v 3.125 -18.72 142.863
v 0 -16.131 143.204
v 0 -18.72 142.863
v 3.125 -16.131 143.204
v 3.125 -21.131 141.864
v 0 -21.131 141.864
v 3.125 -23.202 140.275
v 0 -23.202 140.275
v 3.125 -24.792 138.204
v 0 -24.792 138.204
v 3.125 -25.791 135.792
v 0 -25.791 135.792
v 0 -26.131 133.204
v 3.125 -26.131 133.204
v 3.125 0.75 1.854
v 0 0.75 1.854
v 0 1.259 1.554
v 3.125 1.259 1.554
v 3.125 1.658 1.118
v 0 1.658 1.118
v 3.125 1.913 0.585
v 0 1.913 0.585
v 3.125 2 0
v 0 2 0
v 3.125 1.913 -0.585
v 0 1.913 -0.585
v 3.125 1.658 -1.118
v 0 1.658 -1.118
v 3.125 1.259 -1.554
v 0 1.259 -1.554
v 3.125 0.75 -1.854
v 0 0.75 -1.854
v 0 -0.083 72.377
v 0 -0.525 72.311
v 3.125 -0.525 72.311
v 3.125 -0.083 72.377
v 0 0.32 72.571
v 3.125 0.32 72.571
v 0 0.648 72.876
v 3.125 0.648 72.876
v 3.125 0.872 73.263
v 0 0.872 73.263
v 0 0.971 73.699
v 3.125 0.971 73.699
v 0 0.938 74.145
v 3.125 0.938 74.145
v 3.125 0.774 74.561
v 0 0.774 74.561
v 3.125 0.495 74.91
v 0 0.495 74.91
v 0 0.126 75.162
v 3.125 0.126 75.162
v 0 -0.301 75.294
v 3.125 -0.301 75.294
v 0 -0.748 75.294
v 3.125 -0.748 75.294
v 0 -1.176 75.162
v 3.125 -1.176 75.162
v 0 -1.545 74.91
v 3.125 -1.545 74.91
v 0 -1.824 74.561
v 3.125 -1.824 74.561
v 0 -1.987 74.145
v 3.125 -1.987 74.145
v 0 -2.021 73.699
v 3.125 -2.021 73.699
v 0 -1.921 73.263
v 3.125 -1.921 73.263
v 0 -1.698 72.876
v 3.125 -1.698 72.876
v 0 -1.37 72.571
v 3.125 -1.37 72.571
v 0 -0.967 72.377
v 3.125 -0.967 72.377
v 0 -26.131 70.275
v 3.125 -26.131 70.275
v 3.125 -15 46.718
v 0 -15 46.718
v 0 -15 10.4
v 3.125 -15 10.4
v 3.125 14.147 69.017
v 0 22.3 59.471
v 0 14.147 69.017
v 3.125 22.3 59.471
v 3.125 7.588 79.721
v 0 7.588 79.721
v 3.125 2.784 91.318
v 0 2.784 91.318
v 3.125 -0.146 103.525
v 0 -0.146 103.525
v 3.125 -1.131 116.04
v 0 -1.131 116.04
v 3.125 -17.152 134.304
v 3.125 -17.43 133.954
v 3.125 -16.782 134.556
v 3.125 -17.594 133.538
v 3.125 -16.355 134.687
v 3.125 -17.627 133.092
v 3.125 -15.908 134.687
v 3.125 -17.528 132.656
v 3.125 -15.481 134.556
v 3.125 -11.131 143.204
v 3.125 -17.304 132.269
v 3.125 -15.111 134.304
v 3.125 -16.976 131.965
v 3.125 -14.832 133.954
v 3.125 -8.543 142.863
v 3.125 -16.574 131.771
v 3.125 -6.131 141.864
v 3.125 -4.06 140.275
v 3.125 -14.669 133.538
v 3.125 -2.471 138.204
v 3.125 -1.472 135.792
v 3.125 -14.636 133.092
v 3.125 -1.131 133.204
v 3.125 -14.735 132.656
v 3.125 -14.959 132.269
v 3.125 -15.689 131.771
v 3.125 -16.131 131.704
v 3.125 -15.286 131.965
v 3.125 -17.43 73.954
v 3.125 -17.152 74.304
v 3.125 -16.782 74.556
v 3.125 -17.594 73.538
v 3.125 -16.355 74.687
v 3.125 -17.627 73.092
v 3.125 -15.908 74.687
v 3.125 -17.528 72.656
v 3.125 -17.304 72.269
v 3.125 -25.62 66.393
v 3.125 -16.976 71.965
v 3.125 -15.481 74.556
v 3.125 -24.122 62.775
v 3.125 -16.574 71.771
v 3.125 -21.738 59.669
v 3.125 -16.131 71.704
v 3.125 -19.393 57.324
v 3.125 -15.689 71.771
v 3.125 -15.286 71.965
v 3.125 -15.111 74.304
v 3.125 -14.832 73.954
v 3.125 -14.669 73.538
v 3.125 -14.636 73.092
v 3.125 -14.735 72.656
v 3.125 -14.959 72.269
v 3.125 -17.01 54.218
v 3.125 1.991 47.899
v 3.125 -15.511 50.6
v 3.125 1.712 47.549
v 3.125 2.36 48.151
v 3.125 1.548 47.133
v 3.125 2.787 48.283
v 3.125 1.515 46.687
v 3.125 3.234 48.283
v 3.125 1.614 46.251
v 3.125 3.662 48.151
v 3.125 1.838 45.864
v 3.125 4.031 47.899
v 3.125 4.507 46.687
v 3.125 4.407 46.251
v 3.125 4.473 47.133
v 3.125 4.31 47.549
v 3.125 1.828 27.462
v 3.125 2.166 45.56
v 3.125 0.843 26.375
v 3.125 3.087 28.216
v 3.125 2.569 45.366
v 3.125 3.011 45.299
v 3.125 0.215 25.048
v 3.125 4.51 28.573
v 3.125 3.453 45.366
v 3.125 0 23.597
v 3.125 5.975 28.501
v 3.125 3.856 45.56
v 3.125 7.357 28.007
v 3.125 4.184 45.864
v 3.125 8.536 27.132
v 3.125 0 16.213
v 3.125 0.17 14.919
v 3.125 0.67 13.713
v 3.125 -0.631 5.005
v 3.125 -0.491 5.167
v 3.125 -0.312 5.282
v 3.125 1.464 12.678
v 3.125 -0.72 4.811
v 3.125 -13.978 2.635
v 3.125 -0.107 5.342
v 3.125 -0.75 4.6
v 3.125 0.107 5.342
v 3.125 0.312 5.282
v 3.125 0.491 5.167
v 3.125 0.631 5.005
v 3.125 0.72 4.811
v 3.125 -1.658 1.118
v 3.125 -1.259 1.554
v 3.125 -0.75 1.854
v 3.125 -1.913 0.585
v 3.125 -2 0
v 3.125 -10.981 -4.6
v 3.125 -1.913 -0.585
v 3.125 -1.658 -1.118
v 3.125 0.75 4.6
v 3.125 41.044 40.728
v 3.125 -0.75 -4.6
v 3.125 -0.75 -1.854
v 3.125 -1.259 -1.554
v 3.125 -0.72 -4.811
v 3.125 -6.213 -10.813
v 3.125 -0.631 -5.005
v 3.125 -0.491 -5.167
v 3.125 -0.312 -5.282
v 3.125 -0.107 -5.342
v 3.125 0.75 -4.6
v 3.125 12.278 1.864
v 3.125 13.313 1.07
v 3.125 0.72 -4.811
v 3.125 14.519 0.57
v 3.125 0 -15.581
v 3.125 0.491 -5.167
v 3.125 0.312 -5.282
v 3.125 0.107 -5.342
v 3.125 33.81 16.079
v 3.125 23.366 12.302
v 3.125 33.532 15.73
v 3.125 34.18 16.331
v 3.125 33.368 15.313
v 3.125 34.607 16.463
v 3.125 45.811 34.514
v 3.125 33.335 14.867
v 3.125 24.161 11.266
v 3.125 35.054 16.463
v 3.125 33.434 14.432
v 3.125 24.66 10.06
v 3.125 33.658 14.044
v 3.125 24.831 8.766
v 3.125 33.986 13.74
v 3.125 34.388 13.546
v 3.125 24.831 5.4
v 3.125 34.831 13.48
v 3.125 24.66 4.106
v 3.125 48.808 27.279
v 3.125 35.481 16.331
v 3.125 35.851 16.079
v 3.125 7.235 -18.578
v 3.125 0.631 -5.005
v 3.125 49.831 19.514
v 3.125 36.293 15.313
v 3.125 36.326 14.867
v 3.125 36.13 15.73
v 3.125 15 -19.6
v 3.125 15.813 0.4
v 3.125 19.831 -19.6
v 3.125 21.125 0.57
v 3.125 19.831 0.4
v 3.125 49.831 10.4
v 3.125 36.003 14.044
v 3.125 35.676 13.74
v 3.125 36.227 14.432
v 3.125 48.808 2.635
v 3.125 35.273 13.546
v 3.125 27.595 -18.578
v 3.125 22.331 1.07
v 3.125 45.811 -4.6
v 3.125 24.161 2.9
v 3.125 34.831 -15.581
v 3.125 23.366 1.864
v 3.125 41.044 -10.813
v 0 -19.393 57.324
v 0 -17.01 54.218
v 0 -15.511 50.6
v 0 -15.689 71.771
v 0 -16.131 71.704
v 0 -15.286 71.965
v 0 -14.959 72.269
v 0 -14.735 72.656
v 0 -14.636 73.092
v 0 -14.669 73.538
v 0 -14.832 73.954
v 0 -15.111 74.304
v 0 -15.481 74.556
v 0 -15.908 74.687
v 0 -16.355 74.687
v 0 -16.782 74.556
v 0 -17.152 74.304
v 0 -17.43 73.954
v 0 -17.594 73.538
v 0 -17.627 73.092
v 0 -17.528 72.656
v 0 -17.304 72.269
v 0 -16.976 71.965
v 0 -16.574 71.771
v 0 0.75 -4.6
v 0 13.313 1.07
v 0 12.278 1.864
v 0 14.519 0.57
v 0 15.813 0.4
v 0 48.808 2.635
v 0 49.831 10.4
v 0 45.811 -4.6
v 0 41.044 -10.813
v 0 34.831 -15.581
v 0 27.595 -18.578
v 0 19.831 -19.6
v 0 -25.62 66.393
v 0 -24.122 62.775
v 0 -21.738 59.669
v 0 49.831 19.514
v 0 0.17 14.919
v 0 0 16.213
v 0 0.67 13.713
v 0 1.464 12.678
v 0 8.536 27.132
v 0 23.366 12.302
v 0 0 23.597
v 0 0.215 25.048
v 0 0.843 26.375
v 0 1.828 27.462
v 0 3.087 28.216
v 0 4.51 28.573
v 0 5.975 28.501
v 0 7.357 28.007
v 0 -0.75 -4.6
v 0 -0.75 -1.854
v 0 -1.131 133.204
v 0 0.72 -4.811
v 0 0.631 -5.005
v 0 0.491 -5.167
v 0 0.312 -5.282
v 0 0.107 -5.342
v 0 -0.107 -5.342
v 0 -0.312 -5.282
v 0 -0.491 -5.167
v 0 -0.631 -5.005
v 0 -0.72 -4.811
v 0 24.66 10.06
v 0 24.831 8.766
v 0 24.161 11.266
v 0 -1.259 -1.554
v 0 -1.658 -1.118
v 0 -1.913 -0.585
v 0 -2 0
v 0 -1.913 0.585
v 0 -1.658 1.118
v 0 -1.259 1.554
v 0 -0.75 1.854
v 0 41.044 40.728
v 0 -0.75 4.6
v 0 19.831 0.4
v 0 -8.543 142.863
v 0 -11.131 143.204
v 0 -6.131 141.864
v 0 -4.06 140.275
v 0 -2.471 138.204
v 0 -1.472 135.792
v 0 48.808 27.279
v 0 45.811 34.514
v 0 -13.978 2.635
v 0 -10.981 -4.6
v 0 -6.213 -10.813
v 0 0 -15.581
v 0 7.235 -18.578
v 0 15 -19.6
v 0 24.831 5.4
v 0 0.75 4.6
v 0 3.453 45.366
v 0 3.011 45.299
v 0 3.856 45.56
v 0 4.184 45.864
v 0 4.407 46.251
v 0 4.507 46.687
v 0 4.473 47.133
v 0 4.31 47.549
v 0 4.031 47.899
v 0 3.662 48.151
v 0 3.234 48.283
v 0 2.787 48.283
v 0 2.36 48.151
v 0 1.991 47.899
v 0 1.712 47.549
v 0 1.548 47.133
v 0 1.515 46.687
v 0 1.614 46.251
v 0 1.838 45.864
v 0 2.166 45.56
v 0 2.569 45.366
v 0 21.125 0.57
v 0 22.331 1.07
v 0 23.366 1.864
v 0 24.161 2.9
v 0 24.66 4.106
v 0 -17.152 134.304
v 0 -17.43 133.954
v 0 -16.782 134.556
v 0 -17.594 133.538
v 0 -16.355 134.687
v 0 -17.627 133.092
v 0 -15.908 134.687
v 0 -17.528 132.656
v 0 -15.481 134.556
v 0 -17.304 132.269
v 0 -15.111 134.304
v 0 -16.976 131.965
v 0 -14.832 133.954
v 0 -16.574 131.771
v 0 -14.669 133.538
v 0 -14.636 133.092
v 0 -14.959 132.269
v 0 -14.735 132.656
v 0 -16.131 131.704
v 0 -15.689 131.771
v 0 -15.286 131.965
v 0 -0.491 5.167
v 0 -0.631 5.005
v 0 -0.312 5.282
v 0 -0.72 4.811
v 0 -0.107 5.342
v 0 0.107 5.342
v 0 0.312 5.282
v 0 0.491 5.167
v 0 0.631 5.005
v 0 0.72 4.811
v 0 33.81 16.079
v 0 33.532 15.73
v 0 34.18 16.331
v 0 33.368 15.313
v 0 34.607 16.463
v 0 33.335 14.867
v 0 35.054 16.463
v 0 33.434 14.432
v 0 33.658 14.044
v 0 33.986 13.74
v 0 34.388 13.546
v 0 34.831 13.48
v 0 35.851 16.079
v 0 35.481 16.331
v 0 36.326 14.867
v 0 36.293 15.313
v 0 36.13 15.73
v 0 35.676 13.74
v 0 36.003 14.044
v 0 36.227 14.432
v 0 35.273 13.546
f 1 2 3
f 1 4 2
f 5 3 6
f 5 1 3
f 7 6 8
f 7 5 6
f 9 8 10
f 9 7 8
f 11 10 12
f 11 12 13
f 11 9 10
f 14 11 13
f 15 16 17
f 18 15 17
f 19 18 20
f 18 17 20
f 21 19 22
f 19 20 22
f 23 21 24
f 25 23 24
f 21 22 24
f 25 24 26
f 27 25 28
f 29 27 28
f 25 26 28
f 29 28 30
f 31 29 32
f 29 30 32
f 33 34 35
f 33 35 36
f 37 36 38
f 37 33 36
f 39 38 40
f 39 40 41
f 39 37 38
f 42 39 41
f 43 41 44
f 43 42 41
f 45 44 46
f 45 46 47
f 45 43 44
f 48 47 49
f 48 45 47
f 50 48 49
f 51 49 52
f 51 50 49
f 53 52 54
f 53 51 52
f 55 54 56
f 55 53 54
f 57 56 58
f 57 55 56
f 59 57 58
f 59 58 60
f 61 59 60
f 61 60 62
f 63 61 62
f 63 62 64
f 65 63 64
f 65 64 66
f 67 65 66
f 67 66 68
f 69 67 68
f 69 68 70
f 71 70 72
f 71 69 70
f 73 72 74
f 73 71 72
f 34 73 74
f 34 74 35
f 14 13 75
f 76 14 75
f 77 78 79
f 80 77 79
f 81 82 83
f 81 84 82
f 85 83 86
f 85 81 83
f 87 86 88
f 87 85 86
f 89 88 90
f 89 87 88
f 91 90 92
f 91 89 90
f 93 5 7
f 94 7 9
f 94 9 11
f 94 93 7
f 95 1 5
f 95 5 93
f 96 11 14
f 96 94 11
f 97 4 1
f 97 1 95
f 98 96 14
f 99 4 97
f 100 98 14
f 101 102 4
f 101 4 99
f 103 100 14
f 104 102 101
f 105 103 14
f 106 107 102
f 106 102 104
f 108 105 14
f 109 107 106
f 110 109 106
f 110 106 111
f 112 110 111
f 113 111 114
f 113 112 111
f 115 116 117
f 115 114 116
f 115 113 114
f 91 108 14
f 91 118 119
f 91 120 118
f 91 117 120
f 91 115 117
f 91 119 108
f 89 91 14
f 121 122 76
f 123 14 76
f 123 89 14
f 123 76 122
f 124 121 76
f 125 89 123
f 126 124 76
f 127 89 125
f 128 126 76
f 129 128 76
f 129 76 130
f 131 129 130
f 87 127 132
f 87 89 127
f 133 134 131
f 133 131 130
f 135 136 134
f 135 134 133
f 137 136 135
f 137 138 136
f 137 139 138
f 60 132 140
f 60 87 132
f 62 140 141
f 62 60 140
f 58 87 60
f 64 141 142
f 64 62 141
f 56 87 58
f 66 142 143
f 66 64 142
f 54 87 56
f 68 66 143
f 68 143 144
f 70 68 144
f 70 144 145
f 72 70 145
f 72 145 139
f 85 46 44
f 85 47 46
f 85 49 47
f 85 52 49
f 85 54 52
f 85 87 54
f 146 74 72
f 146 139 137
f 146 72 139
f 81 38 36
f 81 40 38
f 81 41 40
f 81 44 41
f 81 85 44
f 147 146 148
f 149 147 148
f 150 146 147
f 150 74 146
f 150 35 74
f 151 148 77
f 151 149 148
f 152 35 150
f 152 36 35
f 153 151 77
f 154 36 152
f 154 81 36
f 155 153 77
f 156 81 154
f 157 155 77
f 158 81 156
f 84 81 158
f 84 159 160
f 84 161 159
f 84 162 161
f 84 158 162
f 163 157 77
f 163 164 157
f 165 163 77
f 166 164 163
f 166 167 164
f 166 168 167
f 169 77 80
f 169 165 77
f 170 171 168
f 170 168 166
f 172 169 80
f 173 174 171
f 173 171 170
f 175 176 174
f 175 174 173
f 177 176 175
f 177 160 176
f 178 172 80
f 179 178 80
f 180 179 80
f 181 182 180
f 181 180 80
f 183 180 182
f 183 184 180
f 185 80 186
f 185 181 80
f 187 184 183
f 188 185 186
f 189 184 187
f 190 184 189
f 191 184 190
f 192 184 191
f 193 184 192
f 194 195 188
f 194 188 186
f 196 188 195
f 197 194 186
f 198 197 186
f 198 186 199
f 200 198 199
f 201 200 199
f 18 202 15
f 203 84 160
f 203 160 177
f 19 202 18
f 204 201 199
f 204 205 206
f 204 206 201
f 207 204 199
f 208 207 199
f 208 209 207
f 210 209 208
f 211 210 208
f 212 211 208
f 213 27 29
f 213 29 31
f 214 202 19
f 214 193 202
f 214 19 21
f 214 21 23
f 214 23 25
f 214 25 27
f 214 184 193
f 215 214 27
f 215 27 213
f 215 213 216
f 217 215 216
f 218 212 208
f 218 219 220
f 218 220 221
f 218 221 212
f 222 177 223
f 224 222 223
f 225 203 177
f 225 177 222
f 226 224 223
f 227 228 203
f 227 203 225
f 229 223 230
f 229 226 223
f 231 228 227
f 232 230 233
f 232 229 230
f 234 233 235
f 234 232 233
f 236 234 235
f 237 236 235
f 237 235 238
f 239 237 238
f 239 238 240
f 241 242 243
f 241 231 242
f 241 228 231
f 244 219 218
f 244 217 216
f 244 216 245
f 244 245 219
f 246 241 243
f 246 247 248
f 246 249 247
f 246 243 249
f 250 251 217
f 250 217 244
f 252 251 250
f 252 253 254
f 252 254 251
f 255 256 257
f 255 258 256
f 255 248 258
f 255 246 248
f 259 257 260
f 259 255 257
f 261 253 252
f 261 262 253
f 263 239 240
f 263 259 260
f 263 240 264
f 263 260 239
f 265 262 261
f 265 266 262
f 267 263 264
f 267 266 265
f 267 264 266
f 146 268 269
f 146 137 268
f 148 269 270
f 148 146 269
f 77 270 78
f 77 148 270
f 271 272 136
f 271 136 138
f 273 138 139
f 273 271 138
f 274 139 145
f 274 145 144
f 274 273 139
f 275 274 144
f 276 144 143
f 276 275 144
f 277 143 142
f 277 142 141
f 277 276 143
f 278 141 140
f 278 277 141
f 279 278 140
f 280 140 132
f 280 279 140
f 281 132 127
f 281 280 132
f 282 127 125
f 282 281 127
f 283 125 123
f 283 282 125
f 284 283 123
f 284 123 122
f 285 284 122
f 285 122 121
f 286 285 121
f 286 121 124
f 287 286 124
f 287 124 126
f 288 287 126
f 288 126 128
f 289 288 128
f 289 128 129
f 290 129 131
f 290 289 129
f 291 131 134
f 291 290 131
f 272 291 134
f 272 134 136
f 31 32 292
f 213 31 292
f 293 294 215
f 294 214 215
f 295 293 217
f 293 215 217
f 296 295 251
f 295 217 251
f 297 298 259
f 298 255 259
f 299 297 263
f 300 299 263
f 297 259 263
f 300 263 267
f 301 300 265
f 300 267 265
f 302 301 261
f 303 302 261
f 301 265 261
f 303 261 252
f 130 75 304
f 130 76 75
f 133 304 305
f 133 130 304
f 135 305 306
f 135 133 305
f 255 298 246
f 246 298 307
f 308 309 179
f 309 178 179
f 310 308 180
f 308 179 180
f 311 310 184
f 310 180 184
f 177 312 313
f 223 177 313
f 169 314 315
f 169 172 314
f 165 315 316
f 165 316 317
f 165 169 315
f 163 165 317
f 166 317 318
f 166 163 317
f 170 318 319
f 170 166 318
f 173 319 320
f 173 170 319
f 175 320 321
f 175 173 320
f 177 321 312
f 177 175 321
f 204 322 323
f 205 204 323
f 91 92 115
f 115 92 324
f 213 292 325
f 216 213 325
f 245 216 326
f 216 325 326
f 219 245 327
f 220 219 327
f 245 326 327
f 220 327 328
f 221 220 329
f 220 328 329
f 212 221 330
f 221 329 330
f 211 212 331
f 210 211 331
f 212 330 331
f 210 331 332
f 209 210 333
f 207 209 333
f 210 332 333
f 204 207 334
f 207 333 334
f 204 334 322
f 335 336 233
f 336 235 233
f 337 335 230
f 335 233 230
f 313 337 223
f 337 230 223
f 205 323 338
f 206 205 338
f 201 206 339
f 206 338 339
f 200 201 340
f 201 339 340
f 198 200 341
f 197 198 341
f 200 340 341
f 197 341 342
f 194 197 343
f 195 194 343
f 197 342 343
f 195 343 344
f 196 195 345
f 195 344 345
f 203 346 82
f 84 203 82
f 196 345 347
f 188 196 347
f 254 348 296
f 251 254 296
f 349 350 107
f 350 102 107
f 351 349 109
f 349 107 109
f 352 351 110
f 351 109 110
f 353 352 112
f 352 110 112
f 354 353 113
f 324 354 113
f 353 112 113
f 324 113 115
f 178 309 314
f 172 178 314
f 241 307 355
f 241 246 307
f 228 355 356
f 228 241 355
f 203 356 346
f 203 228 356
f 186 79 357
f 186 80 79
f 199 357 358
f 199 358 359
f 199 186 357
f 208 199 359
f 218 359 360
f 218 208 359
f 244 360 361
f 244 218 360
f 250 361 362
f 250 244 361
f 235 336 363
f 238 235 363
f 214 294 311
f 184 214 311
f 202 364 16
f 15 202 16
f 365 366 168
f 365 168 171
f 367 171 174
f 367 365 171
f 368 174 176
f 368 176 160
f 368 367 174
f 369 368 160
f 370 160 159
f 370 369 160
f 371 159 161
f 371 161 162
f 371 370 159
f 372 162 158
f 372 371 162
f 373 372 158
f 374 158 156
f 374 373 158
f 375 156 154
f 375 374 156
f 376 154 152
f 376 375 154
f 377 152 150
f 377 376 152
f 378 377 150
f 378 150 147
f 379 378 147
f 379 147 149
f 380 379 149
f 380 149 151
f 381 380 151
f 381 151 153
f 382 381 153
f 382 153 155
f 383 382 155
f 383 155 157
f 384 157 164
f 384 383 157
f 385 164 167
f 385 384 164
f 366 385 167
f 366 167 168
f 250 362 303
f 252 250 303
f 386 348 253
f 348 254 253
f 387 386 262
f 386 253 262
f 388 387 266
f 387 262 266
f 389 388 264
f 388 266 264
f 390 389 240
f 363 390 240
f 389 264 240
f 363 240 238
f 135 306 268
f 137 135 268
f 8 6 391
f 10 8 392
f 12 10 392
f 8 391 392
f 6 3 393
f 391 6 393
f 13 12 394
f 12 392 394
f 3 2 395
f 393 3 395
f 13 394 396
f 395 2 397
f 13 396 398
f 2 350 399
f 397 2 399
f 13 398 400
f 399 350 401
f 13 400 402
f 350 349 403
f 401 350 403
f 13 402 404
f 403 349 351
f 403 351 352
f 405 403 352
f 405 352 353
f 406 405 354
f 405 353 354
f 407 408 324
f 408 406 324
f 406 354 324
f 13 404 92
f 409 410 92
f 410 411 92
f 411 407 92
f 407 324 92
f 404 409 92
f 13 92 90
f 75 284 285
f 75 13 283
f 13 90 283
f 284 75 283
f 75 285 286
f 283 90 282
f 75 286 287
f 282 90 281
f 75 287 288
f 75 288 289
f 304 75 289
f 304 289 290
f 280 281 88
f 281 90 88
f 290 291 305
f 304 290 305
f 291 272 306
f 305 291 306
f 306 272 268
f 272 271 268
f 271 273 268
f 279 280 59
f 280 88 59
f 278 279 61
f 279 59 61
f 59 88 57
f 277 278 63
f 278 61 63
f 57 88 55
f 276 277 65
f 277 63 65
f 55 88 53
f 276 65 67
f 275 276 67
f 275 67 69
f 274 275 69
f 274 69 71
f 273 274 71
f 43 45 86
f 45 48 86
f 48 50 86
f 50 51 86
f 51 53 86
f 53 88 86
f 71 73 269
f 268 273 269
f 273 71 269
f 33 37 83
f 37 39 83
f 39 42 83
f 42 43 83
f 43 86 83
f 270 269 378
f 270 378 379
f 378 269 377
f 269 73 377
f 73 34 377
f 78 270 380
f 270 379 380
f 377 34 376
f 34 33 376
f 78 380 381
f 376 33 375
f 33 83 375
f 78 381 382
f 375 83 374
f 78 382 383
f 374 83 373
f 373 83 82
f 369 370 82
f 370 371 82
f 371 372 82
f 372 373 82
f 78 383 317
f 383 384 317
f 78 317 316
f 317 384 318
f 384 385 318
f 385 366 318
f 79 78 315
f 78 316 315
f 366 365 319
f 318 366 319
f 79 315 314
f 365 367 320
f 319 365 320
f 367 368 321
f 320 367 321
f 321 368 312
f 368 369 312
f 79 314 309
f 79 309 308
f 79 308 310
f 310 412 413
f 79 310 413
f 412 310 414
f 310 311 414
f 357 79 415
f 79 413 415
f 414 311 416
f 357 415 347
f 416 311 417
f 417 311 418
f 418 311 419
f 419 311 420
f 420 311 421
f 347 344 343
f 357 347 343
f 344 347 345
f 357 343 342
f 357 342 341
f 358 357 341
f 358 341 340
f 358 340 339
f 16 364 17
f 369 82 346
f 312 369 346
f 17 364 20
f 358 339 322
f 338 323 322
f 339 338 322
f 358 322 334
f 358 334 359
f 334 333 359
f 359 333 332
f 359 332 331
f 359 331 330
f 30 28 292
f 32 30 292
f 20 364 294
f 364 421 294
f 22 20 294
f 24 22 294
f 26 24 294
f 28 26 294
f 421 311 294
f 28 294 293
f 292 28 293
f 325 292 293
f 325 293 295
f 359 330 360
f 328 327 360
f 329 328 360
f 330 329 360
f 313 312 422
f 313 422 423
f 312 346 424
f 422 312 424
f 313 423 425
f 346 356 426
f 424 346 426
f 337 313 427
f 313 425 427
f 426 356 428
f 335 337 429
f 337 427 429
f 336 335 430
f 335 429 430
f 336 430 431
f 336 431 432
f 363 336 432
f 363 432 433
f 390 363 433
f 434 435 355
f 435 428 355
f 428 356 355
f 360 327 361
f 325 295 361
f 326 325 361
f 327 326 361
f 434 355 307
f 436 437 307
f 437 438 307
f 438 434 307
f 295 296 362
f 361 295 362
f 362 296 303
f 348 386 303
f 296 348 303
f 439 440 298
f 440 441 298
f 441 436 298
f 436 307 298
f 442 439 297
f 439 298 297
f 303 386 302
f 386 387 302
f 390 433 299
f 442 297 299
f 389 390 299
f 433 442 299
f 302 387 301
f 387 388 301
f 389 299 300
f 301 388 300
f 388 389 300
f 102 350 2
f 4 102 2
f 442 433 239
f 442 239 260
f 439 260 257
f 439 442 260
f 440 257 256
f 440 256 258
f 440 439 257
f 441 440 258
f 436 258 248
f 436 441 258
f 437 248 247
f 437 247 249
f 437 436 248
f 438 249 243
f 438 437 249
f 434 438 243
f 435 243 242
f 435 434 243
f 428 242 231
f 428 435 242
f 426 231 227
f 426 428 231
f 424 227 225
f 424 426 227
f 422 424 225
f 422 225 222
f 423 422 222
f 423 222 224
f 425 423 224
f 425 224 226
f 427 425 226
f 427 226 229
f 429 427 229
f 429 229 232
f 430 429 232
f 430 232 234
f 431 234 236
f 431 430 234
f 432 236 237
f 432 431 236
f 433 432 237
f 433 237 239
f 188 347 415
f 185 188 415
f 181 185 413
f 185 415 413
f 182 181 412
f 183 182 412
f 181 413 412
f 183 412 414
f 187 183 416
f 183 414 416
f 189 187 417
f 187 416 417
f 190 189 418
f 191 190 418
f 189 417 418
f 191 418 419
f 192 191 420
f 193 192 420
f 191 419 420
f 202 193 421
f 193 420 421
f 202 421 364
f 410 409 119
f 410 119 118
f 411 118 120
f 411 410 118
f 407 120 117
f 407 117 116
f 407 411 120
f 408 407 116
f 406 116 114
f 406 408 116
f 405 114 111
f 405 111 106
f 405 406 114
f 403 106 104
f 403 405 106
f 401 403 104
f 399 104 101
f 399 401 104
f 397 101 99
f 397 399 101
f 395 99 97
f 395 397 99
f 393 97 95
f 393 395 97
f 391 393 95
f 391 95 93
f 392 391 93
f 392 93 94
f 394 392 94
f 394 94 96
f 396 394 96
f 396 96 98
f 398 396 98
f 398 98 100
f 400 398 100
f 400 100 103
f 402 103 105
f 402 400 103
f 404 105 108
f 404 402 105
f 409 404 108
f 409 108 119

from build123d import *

# Parameters (mm, degrees)
SKETCH1_R           = 1.5
BOSS_EXTRUDE1_DEPTH = 3.125
FILLET1_R           = 10
FILLET2_R           = 15
FILLET3_R           = 30
FILLET4_R           = 30
FILLET5_R           = 80
FILLET6_R           = 30
FILLET7_R           = 5


with BuildPart() as part:
    # Sketch1 → Boss-Extrude1 (new body)
    with BuildSketch(Plane(origin=(0, 0, 0), x_dir=(0, 0, -1), z_dir=(1, 0, 0))):
        Polygon((-143.20422433, -1.13137085), (-143.20422433, -26.13137085), (-64.062088707, -26.13137085), (-52.930717857, -15), (19.6, -15), (19.6, 49.830569927), (-31.940768363, 49.830569927), (-82.90270914, -1.13137085), align=None)
        with Locations((-46.799347007, 3.010764774)):
            Circle(SKETCH1_R, mode=Mode.SUBTRACT)
        with Locations((-14.979541854, 34.830569927)):
            Circle(SKETCH1_R, mode=Mode.SUBTRACT)
        with Locations((-73.810826048, -0.524769132)):
            Circle(SKETCH1_R, mode=Mode.SUBTRACT)
        with Locations((-73.20422433, -16.13137085)):
            Circle(SKETCH1_R, mode=Mode.SUBTRACT)
        with Locations((-133.20422433, -16.13137085)):
            Circle(SKETCH1_R, mode=Mode.SUBTRACT)
        with BuildLine():
            Line((-4.6, 0.75), (-1.854049622, 0.75))
            ThreePointArc((-1.854049622, 0.75), (0, 2), (1.854049622, 0.75))
            Line((1.854049622, 0.75), (4.6, 0.75))
            ThreePointArc((4.6, 0.75), (5.35, 0), (4.6, -0.75))
            Line((4.6, -0.75), (1.854049622, -0.75))
            ThreePointArc((1.854049622, -0.75), (0, -2), (-1.854049622, -0.75))
            Line((-1.854049622, -0.75), (-4.6, -0.75))
            ThreePointArc((-4.6, -0.75), (-5.35, 0), (-4.6, 0.75))
        make_face(mode=Mode.SUBTRACT)
        Polygon((-35.667976157, 0), (-10.83740623, 24.830569927), (-0.4, 24.830569927), (-0.4, 13.742135624), (-14.142135624, 0), align=None, mode=Mode.SUBTRACT)
    extrude(amount=BOSS_EXTRUDE1_DEPTH)

    # Fillet1
    fillet1_edges = [part.edges().sort_by_distance(p)[0] for p in [
        (1.5625, -26.13137085, 143.20422433),
        (1.5625, -1.13137085, 143.20422433),
    ]]
    fillet(fillet1_edges, radius=FILLET1_R)

    # Fillet2
    fillet2_edges = [part.edges().sort_by_distance(p)[0] for p in [
        (1.5625, -15, 52.930717857),
        (1.5625, -26.13137085, 64.062088707),
    ]]
    fillet(fillet2_edges, radius=FILLET2_R)

    # Fillet3
    fillet3_edges = [part.edges().sort_by_distance(p)[0] for p in [
        (1.5625, -15, -19.6),
    ]]
    fillet(fillet3_edges, radius=FILLET3_R)

    # Fillet4
    fillet4_edges = [part.edges().sort_by_distance(p)[0] for p in [
        (1.5625, 49.830569927, 31.940768363),
    ]]
    fillet(fillet4_edges, radius=FILLET4_R)

    # Fillet5
    fillet5_edges = [part.edges().sort_by_distance(p)[0] for p in [
        (1.5625, -1.13137085, 82.90270914),
    ]]
    fillet(fillet5_edges, radius=FILLET5_R)

    # Fillet6
    fillet6_edges = [part.edges().sort_by_distance(p)[0] for p in [
        (1.5625, 49.830569927, -19.6),
    ]]
    fillet(fillet6_edges, radius=FILLET6_R)

    # Fillet7
    fillet7_edges = [part.edges().sort_by_distance(p)[0] for p in [
        (1.5625, 13.742135624, 0.4),
        (1.5625, 24.830569927, 0.4),
        (1.5625, 24.830569927, 10.83740623),
        (1.5625, 0, 35.667976157),
        (1.5625, 0, 14.142135624),
    ]]
    fillet(fillet7_edges, radius=FILLET7_R)


solid = part.part
